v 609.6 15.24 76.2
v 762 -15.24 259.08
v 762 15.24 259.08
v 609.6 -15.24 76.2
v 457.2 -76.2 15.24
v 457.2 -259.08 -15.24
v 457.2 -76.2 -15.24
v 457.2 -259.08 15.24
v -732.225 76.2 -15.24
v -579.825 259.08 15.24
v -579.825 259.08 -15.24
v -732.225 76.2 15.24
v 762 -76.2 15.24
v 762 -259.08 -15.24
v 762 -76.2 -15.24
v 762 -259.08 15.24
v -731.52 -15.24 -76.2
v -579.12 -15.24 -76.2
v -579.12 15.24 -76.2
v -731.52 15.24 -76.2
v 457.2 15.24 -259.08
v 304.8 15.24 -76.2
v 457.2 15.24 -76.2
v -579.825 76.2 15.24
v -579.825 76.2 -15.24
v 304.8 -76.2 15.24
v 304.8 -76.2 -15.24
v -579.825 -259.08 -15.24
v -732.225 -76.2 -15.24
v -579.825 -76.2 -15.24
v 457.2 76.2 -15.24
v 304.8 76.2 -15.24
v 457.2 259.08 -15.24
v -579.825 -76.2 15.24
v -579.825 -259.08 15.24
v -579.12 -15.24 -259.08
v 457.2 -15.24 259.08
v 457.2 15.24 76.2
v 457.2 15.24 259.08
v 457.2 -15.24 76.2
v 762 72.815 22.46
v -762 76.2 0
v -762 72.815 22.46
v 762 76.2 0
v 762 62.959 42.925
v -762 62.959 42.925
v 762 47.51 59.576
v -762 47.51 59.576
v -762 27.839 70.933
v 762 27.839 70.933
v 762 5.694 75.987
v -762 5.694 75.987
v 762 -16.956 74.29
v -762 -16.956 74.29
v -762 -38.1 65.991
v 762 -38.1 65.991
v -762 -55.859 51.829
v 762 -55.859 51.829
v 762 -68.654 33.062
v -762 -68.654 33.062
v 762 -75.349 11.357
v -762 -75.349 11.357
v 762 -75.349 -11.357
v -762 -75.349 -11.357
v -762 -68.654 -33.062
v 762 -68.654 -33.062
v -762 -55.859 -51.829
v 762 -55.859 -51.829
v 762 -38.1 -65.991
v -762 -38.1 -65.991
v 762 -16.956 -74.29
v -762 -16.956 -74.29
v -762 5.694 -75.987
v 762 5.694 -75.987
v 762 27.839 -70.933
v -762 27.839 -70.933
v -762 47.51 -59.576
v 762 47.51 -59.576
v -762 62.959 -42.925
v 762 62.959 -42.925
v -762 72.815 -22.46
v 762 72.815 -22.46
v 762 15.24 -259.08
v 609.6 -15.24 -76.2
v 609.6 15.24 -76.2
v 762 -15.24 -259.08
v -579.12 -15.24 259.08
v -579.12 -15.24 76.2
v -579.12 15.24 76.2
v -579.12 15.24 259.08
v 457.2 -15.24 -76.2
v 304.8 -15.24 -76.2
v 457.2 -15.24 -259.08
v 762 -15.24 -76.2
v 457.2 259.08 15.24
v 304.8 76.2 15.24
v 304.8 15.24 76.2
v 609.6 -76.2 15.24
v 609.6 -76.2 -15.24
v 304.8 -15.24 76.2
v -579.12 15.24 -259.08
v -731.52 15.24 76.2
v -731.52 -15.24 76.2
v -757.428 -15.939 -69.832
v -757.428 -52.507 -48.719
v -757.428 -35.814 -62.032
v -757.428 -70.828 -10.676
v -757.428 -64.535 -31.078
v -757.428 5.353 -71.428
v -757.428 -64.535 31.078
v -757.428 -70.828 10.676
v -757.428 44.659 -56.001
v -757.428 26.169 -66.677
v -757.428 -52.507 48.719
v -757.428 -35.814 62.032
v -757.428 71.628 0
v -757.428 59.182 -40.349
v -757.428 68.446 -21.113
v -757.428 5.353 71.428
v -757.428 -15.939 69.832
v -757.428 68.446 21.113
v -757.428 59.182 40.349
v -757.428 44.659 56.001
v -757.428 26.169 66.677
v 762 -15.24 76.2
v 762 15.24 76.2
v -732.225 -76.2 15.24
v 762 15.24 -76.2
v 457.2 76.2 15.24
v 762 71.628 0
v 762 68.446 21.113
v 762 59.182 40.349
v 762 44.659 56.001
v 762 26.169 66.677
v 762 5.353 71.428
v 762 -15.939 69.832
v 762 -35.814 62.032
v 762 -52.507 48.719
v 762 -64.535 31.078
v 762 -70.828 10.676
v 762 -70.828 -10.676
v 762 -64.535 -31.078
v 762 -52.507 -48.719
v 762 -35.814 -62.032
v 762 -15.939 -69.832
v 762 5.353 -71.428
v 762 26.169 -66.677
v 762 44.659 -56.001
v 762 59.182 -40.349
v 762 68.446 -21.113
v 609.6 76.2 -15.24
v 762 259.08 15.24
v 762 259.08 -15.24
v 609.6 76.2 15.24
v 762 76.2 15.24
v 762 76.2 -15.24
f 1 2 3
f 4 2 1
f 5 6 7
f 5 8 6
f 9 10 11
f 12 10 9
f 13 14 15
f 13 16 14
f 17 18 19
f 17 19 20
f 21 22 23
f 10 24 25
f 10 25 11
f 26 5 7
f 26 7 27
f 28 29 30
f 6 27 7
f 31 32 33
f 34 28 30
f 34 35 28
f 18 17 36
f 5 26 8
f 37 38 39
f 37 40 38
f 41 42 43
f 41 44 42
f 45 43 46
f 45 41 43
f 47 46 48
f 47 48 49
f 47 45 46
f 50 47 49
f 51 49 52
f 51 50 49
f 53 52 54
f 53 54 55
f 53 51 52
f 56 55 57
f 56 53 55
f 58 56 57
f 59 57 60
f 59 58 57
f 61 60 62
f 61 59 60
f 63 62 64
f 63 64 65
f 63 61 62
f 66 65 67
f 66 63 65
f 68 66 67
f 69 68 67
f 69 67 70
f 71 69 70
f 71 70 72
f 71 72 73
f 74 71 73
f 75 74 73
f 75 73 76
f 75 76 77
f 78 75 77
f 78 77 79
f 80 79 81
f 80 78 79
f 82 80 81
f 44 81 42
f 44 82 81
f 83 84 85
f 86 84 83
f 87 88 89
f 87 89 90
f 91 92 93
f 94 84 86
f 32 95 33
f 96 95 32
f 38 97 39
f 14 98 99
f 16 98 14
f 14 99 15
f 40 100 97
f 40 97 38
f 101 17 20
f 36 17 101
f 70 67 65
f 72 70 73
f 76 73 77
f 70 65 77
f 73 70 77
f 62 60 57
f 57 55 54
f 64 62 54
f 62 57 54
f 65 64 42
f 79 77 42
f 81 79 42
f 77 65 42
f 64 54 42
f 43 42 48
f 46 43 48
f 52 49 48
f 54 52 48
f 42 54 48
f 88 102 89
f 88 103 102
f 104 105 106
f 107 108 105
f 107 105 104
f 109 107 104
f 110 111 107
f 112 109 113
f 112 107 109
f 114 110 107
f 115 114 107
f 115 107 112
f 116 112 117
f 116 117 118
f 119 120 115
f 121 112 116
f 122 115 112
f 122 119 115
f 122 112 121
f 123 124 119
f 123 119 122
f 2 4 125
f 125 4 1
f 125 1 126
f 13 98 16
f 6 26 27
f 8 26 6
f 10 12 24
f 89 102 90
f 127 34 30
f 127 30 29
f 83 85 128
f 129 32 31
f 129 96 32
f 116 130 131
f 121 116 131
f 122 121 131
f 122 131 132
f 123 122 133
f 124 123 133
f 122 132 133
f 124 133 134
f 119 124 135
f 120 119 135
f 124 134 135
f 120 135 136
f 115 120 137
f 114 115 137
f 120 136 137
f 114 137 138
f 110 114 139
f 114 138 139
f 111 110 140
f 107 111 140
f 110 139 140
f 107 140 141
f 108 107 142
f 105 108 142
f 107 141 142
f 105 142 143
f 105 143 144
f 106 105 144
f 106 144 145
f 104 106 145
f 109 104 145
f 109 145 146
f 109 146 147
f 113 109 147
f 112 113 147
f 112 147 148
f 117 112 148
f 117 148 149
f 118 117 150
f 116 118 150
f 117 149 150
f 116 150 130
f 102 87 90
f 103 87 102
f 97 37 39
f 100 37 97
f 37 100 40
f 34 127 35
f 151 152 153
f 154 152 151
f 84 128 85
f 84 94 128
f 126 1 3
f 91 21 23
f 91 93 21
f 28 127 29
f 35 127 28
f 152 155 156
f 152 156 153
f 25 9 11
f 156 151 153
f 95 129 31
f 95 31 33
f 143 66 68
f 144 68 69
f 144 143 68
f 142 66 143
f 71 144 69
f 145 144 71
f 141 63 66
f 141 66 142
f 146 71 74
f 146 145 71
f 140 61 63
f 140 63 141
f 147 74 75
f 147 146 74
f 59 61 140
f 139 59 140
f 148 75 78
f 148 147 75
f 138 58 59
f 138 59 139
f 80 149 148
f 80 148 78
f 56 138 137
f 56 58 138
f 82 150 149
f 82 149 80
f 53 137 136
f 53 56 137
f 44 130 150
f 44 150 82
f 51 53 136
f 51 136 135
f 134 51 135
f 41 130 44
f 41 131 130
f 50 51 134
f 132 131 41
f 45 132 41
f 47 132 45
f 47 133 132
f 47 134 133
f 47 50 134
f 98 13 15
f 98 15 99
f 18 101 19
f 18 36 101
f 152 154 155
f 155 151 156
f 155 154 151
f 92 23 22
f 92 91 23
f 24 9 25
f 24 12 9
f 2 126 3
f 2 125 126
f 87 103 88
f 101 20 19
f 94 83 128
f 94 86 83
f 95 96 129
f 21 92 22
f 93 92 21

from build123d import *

# Parameters (mm, degrees)
F1_R          = 76.2
F2_DEPTH      = 762
F2_DEPTH_BACK = 762
F4_DEPTH      = 15.24
F4_DEPTH_BACK = 15.24
F6_DEPTH      = 15.24
F6_DEPTH_BACK = 15.24
F7_T          = -4.572


# Not quite as in the source:
# - the program builds the solid bodies; features that only make, move or delete a surface that nothing else refers to are left out


with BuildPart() as f2:
    # F1 (on Right) → F2 (new body, two sides)
    with BuildSketch(Plane.YZ) as f2_sk:
        Circle(F1_R)
    extrude(amount=F2_DEPTH)
    extrude(f2_sk.sketch, amount=-F2_DEPTH_BACK)

    # F7
    f7_openings = [f2.faces().sort_by_distance(p)[0] for p in [
        (762, 0, 0),
    ]]
    offset(amount=F7_T, openings=f7_openings)


with BuildPart() as f4:
    # F0 (on Top) → F4 (new body, two sides)
    with BuildSketch(Plane.XY) as f4_sk:
        Polygon((-732.2247028351, 76.2), (-579.8247028351, 76.2), (-579.8247028351, 259.08), align=None)
    extrude(amount=F4_DEPTH)
    extrude(f4_sk.sketch, amount=-F4_DEPTH_BACK)


with BuildPart() as f4b:
    # F0 (on Top) → F4, piece 2 (new body, two sides)
    with BuildSketch(Plane.XY) as f4_2_sk:
        Polygon((-579.8247028351, -259.08), (-579.8247028351, -76.2), (-732.2247028351, -76.2), align=None)
    extrude(amount=F4_DEPTH)
    extrude(f4_2_sk.sketch, amount=-F4_DEPTH_BACK)


with BuildPart() as f4c:
    # F0 (on Top) → F4, piece 3 (new body, two sides)
    with BuildSketch(Plane.XY) as f4_3_sk:
        Polygon((457.2, -259.08), (457.2, -76.2), (304.8, -76.2), align=None)
    extrude(amount=F4_DEPTH)
    extrude(f4_3_sk.sketch, amount=-F4_DEPTH_BACK)


with BuildPart() as f4d:
    # F0 (on Top) → F4, piece 4 (new body, two sides)
    with BuildSketch(Plane.XY) as f4_4_sk:
        Polygon((304.8, 76.2), (457.2, 76.2), (457.2, 259.08), align=None)
    extrude(amount=F4_DEPTH)
    extrude(f4_4_sk.sketch, amount=-F4_DEPTH_BACK)


with BuildPart() as f4e:
    # F0 (on Top) → F4, piece 5 (new body, two sides)
    with BuildSketch(Plane.XY) as f4_5_sk:
        Polygon((609.6, 76.2), (762, 76.2), (762, 259.08), align=None)
    extrude(amount=F4_DEPTH)
    extrude(f4_5_sk.sketch, amount=-F4_DEPTH_BACK)


with BuildPart() as f4f:
    # F0 (on Top) → F4, piece 6 (new body, two sides)
    with BuildSketch(Plane.XY) as f4_6_sk:
        Polygon((762, -259.08), (762, -76.2), (609.6, -76.2), align=None)
    extrude(amount=F4_DEPTH)
    extrude(f4_6_sk.sketch, amount=-F4_DEPTH_BACK)


with BuildPart() as f6:
    # F5 (on Front) → F6 (new body, two sides)
    with BuildSketch(Plane.XZ) as f6_sk:
        Polygon((762, -76.2), (609.6, -76.2), (762, -259.08), align=None)
    extrude(amount=F6_DEPTH)
    extrude(f6_sk.sketch, amount=-F6_DEPTH_BACK)


with BuildPart() as f6b:
    # F5 (on Front) → F6, piece 2 (new body, two sides)
    with BuildSketch(Plane.XZ) as f6_2_sk:
        Polygon((762, 259.08), (609.6, 76.2), (762, 76.2), align=None)
    extrude(amount=F6_DEPTH)
    extrude(f6_2_sk.sketch, amount=-F6_DEPTH_BACK)


with BuildPart() as f6c:
    # F5 (on Front) → F6, piece 3 (new body, two sides)
    with BuildSketch(Plane.XZ) as f6_3_sk:
        Polygon((457.2, -76.2), (304.8, -76.2), (457.2, -259.08), align=None)
    extrude(amount=F6_DEPTH)
    extrude(f6_3_sk.sketch, amount=-F6_DEPTH_BACK)


with BuildPart() as f6d:
    # F5 (on Front) → F6, piece 4 (new body, two sides)
    with BuildSketch(Plane.XZ) as f6_4_sk:
        Polygon((457.2, 259.08), (304.8, 76.2), (457.2, 76.2), align=None)
    extrude(amount=F6_DEPTH)
    extrude(f6_4_sk.sketch, amount=-F6_DEPTH_BACK)


with BuildPart() as f6e:
    # F5 (on Front) → F6, piece 5 (new body, two sides)
    with BuildSketch(Plane.XZ) as f6_5_sk:
        Polygon((-731.52, 76.2), (-579.12, 76.2), (-579.12, 259.08), align=None)
    extrude(amount=F6_DEPTH)
    extrude(f6_5_sk.sketch, amount=-F6_DEPTH_BACK)


with BuildPart() as f6f:
    # F5 (on Front) → F6, piece 6 (new body, two sides)
    with BuildSketch(Plane.XZ) as f6_6_sk:
        Polygon((-579.12, -259.08), (-579.12, -76.2), (-731.52, -76.2), align=None)
    extrude(amount=F6_DEPTH)
    extrude(f6_6_sk.sketch, amount=-F6_DEPTH_BACK)


solid = Compound([f2.part, f4.part, f4b.part, f4c.part, f4d.part, f4e.part, f4f.part, f6.part, f6b.part, f6c.part, f6d.part, f6e.part, f6f.part])
